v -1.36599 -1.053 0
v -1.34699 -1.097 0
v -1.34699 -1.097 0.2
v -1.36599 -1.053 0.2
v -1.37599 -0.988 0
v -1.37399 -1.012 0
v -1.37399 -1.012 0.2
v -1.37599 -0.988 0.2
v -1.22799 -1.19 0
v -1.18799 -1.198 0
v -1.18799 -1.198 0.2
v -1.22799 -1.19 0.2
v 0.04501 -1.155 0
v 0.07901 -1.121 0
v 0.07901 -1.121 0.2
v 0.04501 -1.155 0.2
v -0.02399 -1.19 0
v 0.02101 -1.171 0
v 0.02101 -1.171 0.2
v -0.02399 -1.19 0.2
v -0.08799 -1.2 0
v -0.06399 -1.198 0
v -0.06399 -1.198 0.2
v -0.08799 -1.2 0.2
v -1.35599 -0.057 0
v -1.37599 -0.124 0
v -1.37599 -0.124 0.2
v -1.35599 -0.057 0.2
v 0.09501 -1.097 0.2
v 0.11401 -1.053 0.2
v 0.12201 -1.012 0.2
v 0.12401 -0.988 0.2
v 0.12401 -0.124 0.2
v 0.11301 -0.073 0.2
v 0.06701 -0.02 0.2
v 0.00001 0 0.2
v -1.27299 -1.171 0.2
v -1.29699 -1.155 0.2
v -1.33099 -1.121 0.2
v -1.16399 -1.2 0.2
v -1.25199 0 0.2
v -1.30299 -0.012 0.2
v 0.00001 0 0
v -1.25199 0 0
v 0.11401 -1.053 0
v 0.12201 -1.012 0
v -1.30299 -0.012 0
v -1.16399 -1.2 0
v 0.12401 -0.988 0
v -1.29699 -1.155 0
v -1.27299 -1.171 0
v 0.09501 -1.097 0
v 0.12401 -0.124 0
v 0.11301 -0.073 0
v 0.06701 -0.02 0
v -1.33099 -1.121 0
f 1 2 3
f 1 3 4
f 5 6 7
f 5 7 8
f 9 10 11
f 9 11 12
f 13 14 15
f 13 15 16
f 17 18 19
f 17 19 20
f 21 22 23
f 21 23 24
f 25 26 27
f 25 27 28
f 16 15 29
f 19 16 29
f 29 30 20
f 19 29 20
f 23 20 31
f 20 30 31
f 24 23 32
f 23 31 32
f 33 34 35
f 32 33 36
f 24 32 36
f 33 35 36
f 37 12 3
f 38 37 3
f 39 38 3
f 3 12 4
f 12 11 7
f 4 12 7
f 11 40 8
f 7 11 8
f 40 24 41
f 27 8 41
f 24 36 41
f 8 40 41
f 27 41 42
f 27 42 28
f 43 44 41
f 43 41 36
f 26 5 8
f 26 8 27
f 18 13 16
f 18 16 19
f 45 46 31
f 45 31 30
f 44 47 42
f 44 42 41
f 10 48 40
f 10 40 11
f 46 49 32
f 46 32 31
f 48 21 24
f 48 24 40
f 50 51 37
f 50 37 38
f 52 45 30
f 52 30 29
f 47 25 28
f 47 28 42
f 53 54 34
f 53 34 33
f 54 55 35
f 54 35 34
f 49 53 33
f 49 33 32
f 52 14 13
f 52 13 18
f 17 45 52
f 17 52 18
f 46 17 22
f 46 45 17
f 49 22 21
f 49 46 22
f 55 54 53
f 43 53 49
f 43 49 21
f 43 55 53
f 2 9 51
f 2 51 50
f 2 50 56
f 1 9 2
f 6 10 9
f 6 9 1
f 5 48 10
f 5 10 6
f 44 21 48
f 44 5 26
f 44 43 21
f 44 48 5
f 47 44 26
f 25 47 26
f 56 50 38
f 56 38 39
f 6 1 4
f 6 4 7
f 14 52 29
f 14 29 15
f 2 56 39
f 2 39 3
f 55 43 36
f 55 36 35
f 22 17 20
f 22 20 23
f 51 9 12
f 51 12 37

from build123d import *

# Parameters (mm, degrees)
BOSS_EXTRUDE1_DEPTH   = 0.2
BOSS_EXTRUDE1_2_DEPTH = 0.2


with BuildPart() as part:
    # Model → Boss-Extrude1 (new body)
    with BuildSketch(Plane.XY):
        Polygon((-25.753693147, -3.046), (-25.644493147, -3.06), (-25.613193147, -3.068), (-25.522793147, -3.106), (-25.494793147, -3.122), (-25.417093147, -3.182), (-25.394193147, -3.205), (-25.334593147, -3.282), (-25.318493147, -3.31), (-25.280993147, -3.401), (-25.272593147, -3.432), (-25.258193147, -3.541), (-25.257693147, -3.549), (-25.257693147, -4.045), (-25.234893147, -4.16), (-25.169993147, -4.257), (-25.068993147, -4.325), (-25.023993147, -4.379), (-25.013993147, -4.428), (-25.017993147, -6.466), (-25.037993147, -6.533), (-25.073993147, -6.569), (-25.169993147, -6.633), (-25.234893147, -6.73), (-25.257693147, -6.845), (-25.257693147, -7.341), (-25.258193147, -7.349), (-25.272593147, -7.458), (-25.280993147, -7.49), (-25.318393147, -7.58), (-25.334593147, -7.608), (-25.394193147, -7.686), (-25.417093147, -7.709), (-25.494693147, -7.768), (-25.522793147, -7.784), (-25.613193147, -7.822), (-25.644493147, -7.83), (-25.753693147, -7.845), (-25.761793147, -7.845), (-27.953593147, -7.845), (-27.961693147, -7.845), (-28.070893147, -7.83), (-28.102193147, -7.822), (-28.192593147, -7.784), (-28.220693147, -7.768), (-28.298293147, -7.709), (-28.321193147, -7.686), (-28.380793147, -7.608), (-28.396993147, -7.58), (-28.434393147, -7.49), (-28.442793147, -7.458), (-28.457193147, -7.349), (-28.457693147, -7.341), (-28.457693147, -3.549), (-28.457193147, -3.541), (-28.442793147, -3.432), (-28.434393147, -3.401), (-28.396893147, -3.31), (-28.380793147, -3.282), (-28.321193147, -3.205), (-28.298293147, -3.182), (-28.220593147, -3.122), (-28.192593147, -3.106), (-28.102193147, -3.068), (-28.070893147, -3.06), (-27.961693147, -3.046), (-27.953593147, -3.045), (-25.761793147, -3.045), align=None)
    extrude(amount=BOSS_EXTRUDE1_DEPTH)


with BuildPart() as body_2:
    # Model → Boss-Extrude1 2 (new body)
    with BuildSketch(Plane.XY):
        Polygon((0.067006853, -0.02), (0.113006853, -0.073), (0.124006853, -0.124), (0.124006853, -0.988), (0.122006853, -1.012), (0.114006853, -1.053), (0.095006853, -1.097), (0.079006853, -1.121), (0.045006853, -1.155), (0.021006853, -1.171), (-0.023993147, -1.19), (-0.063993147, -1.198), (-0.087993147, -1.2), (-1.163993147, -1.2), (-1.187993147, -1.198), (-1.227993147, -1.19), (-1.272993147, -1.171), (-1.296993147, -1.155), (-1.330993147, -1.121), (-1.346993147, -1.097), (-1.365993147, -1.053), (-1.373993147, -1.012), (-1.375993147, -0.988), (-1.375993147, -0.124), (-1.355993147, -0.057), (-1.302993147, -0.012), (-1.251993147, 0), (6.853e-06, 0), align=None)
    extrude(amount=BOSS_EXTRUDE1_2_DEPTH)


solid = body_2.part
